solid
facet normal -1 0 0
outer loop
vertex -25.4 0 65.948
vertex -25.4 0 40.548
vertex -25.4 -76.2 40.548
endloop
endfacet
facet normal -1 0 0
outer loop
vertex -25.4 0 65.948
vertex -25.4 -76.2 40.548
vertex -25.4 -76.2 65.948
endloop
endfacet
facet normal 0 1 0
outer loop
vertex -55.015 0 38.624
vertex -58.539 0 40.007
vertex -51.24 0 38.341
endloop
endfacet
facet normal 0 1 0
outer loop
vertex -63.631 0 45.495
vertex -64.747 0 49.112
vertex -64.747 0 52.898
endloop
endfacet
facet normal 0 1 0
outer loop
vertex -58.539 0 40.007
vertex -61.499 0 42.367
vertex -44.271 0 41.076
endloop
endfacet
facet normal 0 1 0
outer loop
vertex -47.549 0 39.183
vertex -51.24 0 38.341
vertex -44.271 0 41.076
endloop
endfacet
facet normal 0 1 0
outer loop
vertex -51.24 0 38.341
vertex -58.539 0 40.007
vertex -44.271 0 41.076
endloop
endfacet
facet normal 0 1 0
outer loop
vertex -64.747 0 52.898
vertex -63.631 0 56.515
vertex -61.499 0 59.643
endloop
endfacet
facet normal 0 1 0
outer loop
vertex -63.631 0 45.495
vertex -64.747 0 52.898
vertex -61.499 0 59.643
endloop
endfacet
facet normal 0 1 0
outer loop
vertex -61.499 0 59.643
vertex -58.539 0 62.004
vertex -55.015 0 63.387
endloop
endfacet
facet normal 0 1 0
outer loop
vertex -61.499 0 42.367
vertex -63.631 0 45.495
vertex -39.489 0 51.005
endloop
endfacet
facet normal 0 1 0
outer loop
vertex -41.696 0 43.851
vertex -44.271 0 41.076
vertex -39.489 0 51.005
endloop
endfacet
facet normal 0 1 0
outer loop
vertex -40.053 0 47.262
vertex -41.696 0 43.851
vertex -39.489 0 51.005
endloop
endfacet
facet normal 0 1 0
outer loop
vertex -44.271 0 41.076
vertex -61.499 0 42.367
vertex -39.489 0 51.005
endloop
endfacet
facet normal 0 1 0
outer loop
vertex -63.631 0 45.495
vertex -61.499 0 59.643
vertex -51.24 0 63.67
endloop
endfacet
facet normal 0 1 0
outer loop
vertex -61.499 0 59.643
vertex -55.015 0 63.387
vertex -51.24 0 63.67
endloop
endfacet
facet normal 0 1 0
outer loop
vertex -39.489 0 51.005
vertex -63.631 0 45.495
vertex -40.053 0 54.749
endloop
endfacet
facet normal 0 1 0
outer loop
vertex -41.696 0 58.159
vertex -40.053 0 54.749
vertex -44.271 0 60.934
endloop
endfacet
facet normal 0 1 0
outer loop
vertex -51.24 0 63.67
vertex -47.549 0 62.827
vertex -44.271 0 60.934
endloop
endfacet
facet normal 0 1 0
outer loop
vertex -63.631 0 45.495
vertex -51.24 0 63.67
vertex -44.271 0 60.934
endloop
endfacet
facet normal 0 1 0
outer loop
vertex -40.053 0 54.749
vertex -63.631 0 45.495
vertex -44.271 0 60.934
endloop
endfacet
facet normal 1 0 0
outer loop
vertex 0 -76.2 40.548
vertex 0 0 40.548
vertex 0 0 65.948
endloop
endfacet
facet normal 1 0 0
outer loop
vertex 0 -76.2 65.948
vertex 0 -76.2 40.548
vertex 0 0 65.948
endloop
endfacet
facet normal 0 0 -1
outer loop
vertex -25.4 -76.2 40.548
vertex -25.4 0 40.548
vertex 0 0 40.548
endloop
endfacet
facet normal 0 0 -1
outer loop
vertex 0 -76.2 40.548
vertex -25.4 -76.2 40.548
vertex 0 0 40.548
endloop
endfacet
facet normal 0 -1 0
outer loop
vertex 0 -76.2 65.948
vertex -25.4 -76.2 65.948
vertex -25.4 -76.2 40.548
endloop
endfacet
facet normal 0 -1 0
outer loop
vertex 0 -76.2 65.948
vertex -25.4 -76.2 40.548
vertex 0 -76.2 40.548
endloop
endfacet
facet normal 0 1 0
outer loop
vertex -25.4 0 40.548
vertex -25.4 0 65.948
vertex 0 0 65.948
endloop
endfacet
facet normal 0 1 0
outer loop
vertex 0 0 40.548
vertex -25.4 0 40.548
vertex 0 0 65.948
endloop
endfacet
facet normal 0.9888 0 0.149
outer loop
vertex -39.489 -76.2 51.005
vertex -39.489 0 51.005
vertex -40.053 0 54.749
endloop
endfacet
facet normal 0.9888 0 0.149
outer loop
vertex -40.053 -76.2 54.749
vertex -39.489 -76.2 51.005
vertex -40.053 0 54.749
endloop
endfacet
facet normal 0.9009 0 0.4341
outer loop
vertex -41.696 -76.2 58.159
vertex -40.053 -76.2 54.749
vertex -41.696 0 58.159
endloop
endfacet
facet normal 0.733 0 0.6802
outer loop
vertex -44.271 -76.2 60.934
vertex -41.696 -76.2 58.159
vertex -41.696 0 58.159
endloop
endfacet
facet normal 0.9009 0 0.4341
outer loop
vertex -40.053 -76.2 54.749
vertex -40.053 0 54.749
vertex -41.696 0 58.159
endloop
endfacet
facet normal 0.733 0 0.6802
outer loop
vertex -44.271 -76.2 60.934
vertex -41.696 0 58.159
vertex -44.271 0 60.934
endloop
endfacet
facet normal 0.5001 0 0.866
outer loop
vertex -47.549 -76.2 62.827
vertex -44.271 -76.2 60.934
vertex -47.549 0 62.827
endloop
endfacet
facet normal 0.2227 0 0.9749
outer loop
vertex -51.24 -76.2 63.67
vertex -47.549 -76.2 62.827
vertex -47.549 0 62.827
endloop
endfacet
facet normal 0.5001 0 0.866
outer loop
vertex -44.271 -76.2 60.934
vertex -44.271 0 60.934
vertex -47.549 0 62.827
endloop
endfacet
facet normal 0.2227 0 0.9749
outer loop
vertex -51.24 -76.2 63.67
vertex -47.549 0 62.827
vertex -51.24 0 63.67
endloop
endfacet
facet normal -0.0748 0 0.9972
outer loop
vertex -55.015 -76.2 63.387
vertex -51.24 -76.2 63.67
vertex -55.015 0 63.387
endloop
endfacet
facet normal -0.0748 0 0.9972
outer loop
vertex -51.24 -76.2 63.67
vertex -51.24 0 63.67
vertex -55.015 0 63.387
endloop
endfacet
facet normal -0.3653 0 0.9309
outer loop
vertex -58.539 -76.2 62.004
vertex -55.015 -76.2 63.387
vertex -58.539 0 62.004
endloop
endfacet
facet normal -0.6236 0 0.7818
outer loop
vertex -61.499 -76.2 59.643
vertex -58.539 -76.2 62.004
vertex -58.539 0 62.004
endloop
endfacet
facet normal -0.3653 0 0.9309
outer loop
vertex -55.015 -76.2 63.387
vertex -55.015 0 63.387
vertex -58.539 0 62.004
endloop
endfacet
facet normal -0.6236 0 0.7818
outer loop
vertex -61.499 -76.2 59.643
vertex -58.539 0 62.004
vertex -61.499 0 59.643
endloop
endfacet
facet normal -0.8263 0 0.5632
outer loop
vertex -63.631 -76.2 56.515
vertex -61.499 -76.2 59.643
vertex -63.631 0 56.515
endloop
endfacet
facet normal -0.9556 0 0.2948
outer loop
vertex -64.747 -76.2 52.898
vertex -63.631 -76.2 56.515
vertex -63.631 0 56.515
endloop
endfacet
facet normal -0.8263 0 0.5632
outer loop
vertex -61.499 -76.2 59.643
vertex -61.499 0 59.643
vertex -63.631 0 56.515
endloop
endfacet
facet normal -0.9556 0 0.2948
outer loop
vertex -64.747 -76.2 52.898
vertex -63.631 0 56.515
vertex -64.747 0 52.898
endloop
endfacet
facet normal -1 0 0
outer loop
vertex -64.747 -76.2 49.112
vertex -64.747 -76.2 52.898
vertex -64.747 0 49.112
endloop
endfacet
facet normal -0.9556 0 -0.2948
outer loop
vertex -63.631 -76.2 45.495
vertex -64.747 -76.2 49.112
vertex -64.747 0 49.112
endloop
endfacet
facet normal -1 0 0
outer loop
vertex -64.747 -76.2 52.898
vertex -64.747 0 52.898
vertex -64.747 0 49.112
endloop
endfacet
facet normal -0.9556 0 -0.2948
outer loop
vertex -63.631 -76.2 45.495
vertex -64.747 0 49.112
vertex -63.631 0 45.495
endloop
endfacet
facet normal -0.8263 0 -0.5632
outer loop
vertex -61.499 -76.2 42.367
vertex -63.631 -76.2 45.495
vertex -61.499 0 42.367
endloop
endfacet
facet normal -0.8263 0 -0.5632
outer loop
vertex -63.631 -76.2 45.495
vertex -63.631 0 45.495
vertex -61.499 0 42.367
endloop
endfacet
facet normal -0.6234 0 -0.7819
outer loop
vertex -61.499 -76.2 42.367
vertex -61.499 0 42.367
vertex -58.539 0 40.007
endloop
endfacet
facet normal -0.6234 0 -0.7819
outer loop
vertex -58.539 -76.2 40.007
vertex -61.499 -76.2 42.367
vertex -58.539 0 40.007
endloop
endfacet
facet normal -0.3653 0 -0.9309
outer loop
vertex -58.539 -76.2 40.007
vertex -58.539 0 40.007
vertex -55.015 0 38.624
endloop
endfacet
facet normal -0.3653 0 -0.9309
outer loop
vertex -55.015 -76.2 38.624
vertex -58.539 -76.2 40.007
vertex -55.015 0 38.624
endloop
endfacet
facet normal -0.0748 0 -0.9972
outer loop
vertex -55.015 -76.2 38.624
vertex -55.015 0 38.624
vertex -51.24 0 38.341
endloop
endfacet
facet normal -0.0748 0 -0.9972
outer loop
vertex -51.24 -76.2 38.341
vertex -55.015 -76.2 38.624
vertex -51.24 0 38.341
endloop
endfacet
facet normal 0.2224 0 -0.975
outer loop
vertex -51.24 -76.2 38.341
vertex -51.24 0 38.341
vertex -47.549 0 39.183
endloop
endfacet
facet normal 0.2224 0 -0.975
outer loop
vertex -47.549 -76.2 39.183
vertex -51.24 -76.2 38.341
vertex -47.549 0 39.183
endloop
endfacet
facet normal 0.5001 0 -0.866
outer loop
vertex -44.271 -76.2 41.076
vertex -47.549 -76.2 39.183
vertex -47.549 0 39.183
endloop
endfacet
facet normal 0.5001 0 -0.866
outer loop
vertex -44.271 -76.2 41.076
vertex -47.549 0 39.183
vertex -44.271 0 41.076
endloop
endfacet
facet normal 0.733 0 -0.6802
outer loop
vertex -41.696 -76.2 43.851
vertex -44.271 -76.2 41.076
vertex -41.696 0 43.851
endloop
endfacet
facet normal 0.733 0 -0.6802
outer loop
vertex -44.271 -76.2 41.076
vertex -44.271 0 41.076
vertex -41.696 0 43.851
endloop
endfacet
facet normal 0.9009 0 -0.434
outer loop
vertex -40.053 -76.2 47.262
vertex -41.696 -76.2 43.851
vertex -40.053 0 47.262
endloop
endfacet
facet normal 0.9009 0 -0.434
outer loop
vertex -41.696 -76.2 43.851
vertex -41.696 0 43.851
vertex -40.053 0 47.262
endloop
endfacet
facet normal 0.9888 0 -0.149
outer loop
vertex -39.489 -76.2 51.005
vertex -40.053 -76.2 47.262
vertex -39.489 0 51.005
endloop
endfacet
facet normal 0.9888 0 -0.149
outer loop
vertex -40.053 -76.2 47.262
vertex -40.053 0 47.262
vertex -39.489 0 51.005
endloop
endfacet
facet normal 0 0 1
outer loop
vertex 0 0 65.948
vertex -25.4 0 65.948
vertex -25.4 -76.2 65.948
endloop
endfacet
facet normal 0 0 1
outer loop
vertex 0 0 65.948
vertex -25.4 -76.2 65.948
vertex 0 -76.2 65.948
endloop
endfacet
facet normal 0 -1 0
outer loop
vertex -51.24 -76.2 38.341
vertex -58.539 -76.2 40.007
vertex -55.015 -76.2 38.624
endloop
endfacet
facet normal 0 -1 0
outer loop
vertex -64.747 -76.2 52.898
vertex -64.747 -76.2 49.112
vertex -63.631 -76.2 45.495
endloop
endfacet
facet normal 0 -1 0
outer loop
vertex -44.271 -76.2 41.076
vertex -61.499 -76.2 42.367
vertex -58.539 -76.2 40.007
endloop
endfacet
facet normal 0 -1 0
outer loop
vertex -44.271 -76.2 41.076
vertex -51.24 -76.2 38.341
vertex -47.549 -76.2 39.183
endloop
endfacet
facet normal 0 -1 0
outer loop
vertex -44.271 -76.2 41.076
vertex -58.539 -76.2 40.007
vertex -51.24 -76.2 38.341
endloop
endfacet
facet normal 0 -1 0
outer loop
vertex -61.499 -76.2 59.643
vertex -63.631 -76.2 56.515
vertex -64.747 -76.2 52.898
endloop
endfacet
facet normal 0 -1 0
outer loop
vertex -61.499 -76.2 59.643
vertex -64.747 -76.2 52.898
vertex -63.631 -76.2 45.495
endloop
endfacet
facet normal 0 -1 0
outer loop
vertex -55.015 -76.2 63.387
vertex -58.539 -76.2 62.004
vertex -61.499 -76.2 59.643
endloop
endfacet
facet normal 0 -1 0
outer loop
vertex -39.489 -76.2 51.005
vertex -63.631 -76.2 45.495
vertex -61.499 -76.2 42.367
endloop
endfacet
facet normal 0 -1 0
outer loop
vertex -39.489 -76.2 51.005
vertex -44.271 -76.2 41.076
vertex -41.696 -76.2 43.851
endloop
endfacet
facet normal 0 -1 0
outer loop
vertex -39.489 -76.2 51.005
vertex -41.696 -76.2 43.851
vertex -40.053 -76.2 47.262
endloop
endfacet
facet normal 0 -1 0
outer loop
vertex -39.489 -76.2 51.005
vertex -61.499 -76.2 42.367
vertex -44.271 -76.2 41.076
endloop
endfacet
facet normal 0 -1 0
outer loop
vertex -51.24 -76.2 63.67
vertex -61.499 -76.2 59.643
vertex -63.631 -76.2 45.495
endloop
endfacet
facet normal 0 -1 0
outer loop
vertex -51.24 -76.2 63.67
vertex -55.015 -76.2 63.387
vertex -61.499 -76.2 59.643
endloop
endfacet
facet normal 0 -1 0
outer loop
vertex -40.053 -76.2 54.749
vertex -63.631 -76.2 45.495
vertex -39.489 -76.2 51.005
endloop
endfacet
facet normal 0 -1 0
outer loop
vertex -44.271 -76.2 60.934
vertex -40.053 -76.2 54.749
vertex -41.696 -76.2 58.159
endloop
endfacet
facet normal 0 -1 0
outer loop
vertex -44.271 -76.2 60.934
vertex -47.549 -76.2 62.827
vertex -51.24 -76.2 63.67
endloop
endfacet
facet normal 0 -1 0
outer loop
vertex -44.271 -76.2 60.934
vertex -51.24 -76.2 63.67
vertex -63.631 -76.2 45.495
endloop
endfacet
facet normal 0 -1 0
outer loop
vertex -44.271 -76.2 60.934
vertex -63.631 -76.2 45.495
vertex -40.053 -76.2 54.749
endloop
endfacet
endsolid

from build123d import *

# Parameters (mm, degrees)
F0_R     = 12.7
F1_DEPTH = 76.2
F2_W     = 25.4
F2_H     = 25.4
F3_DEPTH = 76.2


with BuildPart() as f1:
    # F0 (on Front) → F1 (new body)
    with BuildSketch(Plane.XZ):
        with Locations((-52.189015, 51.005144)):
            Circle(F0_R)
    extrude(amount=F1_DEPTH)


with BuildPart() as f3:
    # F2 (on Front) → F3 (new body)
    with BuildSketch(Plane.XZ):
        with Locations((-12.7, 53.247609)):
            Rectangle(F2_W, F2_H)
    extrude(amount=F3_DEPTH)


solid = Compound([f1.part, f3.part])
